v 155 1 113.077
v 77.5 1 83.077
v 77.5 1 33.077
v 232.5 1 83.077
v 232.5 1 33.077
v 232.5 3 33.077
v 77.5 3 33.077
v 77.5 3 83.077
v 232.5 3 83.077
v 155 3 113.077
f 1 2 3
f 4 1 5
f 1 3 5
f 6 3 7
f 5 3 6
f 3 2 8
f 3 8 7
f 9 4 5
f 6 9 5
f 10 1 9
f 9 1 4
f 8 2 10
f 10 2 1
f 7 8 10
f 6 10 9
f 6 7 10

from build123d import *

# Parameters (mm, degrees)
SKETCH1_W           = 310
SKETCH1_H           = 100
BOSS_EXTRUDE1_DEPTH = 4
SCALE1_SCALE        = 0.5


with BuildPart() as part:
    # Sketch1 → Boss-Extrude1 (new body)
    with BuildSketch(Plane(origin=(0, 0, 0), x_dir=(1, 0, 0), z_dir=(0, 1, 0))):
        Polygon((155, -100), (0, -100), (155, -160), align=None)
        with Locations((155, -50)):
            Rectangle(SKETCH1_W, SKETCH1_H)
        Polygon((155, -100), (155, -160), (310, -100), align=None)
    extrude(amount=BOSS_EXTRUDE1_DEPTH)


with BuildPart() as part_1:
    # Scale1: scaled about (155, 2, 66.153846154)
    add(part.part.scale(SCALE1_SCALE).moved(Location((77.5, 1, 33.076923077))))


solid = part_1.part
